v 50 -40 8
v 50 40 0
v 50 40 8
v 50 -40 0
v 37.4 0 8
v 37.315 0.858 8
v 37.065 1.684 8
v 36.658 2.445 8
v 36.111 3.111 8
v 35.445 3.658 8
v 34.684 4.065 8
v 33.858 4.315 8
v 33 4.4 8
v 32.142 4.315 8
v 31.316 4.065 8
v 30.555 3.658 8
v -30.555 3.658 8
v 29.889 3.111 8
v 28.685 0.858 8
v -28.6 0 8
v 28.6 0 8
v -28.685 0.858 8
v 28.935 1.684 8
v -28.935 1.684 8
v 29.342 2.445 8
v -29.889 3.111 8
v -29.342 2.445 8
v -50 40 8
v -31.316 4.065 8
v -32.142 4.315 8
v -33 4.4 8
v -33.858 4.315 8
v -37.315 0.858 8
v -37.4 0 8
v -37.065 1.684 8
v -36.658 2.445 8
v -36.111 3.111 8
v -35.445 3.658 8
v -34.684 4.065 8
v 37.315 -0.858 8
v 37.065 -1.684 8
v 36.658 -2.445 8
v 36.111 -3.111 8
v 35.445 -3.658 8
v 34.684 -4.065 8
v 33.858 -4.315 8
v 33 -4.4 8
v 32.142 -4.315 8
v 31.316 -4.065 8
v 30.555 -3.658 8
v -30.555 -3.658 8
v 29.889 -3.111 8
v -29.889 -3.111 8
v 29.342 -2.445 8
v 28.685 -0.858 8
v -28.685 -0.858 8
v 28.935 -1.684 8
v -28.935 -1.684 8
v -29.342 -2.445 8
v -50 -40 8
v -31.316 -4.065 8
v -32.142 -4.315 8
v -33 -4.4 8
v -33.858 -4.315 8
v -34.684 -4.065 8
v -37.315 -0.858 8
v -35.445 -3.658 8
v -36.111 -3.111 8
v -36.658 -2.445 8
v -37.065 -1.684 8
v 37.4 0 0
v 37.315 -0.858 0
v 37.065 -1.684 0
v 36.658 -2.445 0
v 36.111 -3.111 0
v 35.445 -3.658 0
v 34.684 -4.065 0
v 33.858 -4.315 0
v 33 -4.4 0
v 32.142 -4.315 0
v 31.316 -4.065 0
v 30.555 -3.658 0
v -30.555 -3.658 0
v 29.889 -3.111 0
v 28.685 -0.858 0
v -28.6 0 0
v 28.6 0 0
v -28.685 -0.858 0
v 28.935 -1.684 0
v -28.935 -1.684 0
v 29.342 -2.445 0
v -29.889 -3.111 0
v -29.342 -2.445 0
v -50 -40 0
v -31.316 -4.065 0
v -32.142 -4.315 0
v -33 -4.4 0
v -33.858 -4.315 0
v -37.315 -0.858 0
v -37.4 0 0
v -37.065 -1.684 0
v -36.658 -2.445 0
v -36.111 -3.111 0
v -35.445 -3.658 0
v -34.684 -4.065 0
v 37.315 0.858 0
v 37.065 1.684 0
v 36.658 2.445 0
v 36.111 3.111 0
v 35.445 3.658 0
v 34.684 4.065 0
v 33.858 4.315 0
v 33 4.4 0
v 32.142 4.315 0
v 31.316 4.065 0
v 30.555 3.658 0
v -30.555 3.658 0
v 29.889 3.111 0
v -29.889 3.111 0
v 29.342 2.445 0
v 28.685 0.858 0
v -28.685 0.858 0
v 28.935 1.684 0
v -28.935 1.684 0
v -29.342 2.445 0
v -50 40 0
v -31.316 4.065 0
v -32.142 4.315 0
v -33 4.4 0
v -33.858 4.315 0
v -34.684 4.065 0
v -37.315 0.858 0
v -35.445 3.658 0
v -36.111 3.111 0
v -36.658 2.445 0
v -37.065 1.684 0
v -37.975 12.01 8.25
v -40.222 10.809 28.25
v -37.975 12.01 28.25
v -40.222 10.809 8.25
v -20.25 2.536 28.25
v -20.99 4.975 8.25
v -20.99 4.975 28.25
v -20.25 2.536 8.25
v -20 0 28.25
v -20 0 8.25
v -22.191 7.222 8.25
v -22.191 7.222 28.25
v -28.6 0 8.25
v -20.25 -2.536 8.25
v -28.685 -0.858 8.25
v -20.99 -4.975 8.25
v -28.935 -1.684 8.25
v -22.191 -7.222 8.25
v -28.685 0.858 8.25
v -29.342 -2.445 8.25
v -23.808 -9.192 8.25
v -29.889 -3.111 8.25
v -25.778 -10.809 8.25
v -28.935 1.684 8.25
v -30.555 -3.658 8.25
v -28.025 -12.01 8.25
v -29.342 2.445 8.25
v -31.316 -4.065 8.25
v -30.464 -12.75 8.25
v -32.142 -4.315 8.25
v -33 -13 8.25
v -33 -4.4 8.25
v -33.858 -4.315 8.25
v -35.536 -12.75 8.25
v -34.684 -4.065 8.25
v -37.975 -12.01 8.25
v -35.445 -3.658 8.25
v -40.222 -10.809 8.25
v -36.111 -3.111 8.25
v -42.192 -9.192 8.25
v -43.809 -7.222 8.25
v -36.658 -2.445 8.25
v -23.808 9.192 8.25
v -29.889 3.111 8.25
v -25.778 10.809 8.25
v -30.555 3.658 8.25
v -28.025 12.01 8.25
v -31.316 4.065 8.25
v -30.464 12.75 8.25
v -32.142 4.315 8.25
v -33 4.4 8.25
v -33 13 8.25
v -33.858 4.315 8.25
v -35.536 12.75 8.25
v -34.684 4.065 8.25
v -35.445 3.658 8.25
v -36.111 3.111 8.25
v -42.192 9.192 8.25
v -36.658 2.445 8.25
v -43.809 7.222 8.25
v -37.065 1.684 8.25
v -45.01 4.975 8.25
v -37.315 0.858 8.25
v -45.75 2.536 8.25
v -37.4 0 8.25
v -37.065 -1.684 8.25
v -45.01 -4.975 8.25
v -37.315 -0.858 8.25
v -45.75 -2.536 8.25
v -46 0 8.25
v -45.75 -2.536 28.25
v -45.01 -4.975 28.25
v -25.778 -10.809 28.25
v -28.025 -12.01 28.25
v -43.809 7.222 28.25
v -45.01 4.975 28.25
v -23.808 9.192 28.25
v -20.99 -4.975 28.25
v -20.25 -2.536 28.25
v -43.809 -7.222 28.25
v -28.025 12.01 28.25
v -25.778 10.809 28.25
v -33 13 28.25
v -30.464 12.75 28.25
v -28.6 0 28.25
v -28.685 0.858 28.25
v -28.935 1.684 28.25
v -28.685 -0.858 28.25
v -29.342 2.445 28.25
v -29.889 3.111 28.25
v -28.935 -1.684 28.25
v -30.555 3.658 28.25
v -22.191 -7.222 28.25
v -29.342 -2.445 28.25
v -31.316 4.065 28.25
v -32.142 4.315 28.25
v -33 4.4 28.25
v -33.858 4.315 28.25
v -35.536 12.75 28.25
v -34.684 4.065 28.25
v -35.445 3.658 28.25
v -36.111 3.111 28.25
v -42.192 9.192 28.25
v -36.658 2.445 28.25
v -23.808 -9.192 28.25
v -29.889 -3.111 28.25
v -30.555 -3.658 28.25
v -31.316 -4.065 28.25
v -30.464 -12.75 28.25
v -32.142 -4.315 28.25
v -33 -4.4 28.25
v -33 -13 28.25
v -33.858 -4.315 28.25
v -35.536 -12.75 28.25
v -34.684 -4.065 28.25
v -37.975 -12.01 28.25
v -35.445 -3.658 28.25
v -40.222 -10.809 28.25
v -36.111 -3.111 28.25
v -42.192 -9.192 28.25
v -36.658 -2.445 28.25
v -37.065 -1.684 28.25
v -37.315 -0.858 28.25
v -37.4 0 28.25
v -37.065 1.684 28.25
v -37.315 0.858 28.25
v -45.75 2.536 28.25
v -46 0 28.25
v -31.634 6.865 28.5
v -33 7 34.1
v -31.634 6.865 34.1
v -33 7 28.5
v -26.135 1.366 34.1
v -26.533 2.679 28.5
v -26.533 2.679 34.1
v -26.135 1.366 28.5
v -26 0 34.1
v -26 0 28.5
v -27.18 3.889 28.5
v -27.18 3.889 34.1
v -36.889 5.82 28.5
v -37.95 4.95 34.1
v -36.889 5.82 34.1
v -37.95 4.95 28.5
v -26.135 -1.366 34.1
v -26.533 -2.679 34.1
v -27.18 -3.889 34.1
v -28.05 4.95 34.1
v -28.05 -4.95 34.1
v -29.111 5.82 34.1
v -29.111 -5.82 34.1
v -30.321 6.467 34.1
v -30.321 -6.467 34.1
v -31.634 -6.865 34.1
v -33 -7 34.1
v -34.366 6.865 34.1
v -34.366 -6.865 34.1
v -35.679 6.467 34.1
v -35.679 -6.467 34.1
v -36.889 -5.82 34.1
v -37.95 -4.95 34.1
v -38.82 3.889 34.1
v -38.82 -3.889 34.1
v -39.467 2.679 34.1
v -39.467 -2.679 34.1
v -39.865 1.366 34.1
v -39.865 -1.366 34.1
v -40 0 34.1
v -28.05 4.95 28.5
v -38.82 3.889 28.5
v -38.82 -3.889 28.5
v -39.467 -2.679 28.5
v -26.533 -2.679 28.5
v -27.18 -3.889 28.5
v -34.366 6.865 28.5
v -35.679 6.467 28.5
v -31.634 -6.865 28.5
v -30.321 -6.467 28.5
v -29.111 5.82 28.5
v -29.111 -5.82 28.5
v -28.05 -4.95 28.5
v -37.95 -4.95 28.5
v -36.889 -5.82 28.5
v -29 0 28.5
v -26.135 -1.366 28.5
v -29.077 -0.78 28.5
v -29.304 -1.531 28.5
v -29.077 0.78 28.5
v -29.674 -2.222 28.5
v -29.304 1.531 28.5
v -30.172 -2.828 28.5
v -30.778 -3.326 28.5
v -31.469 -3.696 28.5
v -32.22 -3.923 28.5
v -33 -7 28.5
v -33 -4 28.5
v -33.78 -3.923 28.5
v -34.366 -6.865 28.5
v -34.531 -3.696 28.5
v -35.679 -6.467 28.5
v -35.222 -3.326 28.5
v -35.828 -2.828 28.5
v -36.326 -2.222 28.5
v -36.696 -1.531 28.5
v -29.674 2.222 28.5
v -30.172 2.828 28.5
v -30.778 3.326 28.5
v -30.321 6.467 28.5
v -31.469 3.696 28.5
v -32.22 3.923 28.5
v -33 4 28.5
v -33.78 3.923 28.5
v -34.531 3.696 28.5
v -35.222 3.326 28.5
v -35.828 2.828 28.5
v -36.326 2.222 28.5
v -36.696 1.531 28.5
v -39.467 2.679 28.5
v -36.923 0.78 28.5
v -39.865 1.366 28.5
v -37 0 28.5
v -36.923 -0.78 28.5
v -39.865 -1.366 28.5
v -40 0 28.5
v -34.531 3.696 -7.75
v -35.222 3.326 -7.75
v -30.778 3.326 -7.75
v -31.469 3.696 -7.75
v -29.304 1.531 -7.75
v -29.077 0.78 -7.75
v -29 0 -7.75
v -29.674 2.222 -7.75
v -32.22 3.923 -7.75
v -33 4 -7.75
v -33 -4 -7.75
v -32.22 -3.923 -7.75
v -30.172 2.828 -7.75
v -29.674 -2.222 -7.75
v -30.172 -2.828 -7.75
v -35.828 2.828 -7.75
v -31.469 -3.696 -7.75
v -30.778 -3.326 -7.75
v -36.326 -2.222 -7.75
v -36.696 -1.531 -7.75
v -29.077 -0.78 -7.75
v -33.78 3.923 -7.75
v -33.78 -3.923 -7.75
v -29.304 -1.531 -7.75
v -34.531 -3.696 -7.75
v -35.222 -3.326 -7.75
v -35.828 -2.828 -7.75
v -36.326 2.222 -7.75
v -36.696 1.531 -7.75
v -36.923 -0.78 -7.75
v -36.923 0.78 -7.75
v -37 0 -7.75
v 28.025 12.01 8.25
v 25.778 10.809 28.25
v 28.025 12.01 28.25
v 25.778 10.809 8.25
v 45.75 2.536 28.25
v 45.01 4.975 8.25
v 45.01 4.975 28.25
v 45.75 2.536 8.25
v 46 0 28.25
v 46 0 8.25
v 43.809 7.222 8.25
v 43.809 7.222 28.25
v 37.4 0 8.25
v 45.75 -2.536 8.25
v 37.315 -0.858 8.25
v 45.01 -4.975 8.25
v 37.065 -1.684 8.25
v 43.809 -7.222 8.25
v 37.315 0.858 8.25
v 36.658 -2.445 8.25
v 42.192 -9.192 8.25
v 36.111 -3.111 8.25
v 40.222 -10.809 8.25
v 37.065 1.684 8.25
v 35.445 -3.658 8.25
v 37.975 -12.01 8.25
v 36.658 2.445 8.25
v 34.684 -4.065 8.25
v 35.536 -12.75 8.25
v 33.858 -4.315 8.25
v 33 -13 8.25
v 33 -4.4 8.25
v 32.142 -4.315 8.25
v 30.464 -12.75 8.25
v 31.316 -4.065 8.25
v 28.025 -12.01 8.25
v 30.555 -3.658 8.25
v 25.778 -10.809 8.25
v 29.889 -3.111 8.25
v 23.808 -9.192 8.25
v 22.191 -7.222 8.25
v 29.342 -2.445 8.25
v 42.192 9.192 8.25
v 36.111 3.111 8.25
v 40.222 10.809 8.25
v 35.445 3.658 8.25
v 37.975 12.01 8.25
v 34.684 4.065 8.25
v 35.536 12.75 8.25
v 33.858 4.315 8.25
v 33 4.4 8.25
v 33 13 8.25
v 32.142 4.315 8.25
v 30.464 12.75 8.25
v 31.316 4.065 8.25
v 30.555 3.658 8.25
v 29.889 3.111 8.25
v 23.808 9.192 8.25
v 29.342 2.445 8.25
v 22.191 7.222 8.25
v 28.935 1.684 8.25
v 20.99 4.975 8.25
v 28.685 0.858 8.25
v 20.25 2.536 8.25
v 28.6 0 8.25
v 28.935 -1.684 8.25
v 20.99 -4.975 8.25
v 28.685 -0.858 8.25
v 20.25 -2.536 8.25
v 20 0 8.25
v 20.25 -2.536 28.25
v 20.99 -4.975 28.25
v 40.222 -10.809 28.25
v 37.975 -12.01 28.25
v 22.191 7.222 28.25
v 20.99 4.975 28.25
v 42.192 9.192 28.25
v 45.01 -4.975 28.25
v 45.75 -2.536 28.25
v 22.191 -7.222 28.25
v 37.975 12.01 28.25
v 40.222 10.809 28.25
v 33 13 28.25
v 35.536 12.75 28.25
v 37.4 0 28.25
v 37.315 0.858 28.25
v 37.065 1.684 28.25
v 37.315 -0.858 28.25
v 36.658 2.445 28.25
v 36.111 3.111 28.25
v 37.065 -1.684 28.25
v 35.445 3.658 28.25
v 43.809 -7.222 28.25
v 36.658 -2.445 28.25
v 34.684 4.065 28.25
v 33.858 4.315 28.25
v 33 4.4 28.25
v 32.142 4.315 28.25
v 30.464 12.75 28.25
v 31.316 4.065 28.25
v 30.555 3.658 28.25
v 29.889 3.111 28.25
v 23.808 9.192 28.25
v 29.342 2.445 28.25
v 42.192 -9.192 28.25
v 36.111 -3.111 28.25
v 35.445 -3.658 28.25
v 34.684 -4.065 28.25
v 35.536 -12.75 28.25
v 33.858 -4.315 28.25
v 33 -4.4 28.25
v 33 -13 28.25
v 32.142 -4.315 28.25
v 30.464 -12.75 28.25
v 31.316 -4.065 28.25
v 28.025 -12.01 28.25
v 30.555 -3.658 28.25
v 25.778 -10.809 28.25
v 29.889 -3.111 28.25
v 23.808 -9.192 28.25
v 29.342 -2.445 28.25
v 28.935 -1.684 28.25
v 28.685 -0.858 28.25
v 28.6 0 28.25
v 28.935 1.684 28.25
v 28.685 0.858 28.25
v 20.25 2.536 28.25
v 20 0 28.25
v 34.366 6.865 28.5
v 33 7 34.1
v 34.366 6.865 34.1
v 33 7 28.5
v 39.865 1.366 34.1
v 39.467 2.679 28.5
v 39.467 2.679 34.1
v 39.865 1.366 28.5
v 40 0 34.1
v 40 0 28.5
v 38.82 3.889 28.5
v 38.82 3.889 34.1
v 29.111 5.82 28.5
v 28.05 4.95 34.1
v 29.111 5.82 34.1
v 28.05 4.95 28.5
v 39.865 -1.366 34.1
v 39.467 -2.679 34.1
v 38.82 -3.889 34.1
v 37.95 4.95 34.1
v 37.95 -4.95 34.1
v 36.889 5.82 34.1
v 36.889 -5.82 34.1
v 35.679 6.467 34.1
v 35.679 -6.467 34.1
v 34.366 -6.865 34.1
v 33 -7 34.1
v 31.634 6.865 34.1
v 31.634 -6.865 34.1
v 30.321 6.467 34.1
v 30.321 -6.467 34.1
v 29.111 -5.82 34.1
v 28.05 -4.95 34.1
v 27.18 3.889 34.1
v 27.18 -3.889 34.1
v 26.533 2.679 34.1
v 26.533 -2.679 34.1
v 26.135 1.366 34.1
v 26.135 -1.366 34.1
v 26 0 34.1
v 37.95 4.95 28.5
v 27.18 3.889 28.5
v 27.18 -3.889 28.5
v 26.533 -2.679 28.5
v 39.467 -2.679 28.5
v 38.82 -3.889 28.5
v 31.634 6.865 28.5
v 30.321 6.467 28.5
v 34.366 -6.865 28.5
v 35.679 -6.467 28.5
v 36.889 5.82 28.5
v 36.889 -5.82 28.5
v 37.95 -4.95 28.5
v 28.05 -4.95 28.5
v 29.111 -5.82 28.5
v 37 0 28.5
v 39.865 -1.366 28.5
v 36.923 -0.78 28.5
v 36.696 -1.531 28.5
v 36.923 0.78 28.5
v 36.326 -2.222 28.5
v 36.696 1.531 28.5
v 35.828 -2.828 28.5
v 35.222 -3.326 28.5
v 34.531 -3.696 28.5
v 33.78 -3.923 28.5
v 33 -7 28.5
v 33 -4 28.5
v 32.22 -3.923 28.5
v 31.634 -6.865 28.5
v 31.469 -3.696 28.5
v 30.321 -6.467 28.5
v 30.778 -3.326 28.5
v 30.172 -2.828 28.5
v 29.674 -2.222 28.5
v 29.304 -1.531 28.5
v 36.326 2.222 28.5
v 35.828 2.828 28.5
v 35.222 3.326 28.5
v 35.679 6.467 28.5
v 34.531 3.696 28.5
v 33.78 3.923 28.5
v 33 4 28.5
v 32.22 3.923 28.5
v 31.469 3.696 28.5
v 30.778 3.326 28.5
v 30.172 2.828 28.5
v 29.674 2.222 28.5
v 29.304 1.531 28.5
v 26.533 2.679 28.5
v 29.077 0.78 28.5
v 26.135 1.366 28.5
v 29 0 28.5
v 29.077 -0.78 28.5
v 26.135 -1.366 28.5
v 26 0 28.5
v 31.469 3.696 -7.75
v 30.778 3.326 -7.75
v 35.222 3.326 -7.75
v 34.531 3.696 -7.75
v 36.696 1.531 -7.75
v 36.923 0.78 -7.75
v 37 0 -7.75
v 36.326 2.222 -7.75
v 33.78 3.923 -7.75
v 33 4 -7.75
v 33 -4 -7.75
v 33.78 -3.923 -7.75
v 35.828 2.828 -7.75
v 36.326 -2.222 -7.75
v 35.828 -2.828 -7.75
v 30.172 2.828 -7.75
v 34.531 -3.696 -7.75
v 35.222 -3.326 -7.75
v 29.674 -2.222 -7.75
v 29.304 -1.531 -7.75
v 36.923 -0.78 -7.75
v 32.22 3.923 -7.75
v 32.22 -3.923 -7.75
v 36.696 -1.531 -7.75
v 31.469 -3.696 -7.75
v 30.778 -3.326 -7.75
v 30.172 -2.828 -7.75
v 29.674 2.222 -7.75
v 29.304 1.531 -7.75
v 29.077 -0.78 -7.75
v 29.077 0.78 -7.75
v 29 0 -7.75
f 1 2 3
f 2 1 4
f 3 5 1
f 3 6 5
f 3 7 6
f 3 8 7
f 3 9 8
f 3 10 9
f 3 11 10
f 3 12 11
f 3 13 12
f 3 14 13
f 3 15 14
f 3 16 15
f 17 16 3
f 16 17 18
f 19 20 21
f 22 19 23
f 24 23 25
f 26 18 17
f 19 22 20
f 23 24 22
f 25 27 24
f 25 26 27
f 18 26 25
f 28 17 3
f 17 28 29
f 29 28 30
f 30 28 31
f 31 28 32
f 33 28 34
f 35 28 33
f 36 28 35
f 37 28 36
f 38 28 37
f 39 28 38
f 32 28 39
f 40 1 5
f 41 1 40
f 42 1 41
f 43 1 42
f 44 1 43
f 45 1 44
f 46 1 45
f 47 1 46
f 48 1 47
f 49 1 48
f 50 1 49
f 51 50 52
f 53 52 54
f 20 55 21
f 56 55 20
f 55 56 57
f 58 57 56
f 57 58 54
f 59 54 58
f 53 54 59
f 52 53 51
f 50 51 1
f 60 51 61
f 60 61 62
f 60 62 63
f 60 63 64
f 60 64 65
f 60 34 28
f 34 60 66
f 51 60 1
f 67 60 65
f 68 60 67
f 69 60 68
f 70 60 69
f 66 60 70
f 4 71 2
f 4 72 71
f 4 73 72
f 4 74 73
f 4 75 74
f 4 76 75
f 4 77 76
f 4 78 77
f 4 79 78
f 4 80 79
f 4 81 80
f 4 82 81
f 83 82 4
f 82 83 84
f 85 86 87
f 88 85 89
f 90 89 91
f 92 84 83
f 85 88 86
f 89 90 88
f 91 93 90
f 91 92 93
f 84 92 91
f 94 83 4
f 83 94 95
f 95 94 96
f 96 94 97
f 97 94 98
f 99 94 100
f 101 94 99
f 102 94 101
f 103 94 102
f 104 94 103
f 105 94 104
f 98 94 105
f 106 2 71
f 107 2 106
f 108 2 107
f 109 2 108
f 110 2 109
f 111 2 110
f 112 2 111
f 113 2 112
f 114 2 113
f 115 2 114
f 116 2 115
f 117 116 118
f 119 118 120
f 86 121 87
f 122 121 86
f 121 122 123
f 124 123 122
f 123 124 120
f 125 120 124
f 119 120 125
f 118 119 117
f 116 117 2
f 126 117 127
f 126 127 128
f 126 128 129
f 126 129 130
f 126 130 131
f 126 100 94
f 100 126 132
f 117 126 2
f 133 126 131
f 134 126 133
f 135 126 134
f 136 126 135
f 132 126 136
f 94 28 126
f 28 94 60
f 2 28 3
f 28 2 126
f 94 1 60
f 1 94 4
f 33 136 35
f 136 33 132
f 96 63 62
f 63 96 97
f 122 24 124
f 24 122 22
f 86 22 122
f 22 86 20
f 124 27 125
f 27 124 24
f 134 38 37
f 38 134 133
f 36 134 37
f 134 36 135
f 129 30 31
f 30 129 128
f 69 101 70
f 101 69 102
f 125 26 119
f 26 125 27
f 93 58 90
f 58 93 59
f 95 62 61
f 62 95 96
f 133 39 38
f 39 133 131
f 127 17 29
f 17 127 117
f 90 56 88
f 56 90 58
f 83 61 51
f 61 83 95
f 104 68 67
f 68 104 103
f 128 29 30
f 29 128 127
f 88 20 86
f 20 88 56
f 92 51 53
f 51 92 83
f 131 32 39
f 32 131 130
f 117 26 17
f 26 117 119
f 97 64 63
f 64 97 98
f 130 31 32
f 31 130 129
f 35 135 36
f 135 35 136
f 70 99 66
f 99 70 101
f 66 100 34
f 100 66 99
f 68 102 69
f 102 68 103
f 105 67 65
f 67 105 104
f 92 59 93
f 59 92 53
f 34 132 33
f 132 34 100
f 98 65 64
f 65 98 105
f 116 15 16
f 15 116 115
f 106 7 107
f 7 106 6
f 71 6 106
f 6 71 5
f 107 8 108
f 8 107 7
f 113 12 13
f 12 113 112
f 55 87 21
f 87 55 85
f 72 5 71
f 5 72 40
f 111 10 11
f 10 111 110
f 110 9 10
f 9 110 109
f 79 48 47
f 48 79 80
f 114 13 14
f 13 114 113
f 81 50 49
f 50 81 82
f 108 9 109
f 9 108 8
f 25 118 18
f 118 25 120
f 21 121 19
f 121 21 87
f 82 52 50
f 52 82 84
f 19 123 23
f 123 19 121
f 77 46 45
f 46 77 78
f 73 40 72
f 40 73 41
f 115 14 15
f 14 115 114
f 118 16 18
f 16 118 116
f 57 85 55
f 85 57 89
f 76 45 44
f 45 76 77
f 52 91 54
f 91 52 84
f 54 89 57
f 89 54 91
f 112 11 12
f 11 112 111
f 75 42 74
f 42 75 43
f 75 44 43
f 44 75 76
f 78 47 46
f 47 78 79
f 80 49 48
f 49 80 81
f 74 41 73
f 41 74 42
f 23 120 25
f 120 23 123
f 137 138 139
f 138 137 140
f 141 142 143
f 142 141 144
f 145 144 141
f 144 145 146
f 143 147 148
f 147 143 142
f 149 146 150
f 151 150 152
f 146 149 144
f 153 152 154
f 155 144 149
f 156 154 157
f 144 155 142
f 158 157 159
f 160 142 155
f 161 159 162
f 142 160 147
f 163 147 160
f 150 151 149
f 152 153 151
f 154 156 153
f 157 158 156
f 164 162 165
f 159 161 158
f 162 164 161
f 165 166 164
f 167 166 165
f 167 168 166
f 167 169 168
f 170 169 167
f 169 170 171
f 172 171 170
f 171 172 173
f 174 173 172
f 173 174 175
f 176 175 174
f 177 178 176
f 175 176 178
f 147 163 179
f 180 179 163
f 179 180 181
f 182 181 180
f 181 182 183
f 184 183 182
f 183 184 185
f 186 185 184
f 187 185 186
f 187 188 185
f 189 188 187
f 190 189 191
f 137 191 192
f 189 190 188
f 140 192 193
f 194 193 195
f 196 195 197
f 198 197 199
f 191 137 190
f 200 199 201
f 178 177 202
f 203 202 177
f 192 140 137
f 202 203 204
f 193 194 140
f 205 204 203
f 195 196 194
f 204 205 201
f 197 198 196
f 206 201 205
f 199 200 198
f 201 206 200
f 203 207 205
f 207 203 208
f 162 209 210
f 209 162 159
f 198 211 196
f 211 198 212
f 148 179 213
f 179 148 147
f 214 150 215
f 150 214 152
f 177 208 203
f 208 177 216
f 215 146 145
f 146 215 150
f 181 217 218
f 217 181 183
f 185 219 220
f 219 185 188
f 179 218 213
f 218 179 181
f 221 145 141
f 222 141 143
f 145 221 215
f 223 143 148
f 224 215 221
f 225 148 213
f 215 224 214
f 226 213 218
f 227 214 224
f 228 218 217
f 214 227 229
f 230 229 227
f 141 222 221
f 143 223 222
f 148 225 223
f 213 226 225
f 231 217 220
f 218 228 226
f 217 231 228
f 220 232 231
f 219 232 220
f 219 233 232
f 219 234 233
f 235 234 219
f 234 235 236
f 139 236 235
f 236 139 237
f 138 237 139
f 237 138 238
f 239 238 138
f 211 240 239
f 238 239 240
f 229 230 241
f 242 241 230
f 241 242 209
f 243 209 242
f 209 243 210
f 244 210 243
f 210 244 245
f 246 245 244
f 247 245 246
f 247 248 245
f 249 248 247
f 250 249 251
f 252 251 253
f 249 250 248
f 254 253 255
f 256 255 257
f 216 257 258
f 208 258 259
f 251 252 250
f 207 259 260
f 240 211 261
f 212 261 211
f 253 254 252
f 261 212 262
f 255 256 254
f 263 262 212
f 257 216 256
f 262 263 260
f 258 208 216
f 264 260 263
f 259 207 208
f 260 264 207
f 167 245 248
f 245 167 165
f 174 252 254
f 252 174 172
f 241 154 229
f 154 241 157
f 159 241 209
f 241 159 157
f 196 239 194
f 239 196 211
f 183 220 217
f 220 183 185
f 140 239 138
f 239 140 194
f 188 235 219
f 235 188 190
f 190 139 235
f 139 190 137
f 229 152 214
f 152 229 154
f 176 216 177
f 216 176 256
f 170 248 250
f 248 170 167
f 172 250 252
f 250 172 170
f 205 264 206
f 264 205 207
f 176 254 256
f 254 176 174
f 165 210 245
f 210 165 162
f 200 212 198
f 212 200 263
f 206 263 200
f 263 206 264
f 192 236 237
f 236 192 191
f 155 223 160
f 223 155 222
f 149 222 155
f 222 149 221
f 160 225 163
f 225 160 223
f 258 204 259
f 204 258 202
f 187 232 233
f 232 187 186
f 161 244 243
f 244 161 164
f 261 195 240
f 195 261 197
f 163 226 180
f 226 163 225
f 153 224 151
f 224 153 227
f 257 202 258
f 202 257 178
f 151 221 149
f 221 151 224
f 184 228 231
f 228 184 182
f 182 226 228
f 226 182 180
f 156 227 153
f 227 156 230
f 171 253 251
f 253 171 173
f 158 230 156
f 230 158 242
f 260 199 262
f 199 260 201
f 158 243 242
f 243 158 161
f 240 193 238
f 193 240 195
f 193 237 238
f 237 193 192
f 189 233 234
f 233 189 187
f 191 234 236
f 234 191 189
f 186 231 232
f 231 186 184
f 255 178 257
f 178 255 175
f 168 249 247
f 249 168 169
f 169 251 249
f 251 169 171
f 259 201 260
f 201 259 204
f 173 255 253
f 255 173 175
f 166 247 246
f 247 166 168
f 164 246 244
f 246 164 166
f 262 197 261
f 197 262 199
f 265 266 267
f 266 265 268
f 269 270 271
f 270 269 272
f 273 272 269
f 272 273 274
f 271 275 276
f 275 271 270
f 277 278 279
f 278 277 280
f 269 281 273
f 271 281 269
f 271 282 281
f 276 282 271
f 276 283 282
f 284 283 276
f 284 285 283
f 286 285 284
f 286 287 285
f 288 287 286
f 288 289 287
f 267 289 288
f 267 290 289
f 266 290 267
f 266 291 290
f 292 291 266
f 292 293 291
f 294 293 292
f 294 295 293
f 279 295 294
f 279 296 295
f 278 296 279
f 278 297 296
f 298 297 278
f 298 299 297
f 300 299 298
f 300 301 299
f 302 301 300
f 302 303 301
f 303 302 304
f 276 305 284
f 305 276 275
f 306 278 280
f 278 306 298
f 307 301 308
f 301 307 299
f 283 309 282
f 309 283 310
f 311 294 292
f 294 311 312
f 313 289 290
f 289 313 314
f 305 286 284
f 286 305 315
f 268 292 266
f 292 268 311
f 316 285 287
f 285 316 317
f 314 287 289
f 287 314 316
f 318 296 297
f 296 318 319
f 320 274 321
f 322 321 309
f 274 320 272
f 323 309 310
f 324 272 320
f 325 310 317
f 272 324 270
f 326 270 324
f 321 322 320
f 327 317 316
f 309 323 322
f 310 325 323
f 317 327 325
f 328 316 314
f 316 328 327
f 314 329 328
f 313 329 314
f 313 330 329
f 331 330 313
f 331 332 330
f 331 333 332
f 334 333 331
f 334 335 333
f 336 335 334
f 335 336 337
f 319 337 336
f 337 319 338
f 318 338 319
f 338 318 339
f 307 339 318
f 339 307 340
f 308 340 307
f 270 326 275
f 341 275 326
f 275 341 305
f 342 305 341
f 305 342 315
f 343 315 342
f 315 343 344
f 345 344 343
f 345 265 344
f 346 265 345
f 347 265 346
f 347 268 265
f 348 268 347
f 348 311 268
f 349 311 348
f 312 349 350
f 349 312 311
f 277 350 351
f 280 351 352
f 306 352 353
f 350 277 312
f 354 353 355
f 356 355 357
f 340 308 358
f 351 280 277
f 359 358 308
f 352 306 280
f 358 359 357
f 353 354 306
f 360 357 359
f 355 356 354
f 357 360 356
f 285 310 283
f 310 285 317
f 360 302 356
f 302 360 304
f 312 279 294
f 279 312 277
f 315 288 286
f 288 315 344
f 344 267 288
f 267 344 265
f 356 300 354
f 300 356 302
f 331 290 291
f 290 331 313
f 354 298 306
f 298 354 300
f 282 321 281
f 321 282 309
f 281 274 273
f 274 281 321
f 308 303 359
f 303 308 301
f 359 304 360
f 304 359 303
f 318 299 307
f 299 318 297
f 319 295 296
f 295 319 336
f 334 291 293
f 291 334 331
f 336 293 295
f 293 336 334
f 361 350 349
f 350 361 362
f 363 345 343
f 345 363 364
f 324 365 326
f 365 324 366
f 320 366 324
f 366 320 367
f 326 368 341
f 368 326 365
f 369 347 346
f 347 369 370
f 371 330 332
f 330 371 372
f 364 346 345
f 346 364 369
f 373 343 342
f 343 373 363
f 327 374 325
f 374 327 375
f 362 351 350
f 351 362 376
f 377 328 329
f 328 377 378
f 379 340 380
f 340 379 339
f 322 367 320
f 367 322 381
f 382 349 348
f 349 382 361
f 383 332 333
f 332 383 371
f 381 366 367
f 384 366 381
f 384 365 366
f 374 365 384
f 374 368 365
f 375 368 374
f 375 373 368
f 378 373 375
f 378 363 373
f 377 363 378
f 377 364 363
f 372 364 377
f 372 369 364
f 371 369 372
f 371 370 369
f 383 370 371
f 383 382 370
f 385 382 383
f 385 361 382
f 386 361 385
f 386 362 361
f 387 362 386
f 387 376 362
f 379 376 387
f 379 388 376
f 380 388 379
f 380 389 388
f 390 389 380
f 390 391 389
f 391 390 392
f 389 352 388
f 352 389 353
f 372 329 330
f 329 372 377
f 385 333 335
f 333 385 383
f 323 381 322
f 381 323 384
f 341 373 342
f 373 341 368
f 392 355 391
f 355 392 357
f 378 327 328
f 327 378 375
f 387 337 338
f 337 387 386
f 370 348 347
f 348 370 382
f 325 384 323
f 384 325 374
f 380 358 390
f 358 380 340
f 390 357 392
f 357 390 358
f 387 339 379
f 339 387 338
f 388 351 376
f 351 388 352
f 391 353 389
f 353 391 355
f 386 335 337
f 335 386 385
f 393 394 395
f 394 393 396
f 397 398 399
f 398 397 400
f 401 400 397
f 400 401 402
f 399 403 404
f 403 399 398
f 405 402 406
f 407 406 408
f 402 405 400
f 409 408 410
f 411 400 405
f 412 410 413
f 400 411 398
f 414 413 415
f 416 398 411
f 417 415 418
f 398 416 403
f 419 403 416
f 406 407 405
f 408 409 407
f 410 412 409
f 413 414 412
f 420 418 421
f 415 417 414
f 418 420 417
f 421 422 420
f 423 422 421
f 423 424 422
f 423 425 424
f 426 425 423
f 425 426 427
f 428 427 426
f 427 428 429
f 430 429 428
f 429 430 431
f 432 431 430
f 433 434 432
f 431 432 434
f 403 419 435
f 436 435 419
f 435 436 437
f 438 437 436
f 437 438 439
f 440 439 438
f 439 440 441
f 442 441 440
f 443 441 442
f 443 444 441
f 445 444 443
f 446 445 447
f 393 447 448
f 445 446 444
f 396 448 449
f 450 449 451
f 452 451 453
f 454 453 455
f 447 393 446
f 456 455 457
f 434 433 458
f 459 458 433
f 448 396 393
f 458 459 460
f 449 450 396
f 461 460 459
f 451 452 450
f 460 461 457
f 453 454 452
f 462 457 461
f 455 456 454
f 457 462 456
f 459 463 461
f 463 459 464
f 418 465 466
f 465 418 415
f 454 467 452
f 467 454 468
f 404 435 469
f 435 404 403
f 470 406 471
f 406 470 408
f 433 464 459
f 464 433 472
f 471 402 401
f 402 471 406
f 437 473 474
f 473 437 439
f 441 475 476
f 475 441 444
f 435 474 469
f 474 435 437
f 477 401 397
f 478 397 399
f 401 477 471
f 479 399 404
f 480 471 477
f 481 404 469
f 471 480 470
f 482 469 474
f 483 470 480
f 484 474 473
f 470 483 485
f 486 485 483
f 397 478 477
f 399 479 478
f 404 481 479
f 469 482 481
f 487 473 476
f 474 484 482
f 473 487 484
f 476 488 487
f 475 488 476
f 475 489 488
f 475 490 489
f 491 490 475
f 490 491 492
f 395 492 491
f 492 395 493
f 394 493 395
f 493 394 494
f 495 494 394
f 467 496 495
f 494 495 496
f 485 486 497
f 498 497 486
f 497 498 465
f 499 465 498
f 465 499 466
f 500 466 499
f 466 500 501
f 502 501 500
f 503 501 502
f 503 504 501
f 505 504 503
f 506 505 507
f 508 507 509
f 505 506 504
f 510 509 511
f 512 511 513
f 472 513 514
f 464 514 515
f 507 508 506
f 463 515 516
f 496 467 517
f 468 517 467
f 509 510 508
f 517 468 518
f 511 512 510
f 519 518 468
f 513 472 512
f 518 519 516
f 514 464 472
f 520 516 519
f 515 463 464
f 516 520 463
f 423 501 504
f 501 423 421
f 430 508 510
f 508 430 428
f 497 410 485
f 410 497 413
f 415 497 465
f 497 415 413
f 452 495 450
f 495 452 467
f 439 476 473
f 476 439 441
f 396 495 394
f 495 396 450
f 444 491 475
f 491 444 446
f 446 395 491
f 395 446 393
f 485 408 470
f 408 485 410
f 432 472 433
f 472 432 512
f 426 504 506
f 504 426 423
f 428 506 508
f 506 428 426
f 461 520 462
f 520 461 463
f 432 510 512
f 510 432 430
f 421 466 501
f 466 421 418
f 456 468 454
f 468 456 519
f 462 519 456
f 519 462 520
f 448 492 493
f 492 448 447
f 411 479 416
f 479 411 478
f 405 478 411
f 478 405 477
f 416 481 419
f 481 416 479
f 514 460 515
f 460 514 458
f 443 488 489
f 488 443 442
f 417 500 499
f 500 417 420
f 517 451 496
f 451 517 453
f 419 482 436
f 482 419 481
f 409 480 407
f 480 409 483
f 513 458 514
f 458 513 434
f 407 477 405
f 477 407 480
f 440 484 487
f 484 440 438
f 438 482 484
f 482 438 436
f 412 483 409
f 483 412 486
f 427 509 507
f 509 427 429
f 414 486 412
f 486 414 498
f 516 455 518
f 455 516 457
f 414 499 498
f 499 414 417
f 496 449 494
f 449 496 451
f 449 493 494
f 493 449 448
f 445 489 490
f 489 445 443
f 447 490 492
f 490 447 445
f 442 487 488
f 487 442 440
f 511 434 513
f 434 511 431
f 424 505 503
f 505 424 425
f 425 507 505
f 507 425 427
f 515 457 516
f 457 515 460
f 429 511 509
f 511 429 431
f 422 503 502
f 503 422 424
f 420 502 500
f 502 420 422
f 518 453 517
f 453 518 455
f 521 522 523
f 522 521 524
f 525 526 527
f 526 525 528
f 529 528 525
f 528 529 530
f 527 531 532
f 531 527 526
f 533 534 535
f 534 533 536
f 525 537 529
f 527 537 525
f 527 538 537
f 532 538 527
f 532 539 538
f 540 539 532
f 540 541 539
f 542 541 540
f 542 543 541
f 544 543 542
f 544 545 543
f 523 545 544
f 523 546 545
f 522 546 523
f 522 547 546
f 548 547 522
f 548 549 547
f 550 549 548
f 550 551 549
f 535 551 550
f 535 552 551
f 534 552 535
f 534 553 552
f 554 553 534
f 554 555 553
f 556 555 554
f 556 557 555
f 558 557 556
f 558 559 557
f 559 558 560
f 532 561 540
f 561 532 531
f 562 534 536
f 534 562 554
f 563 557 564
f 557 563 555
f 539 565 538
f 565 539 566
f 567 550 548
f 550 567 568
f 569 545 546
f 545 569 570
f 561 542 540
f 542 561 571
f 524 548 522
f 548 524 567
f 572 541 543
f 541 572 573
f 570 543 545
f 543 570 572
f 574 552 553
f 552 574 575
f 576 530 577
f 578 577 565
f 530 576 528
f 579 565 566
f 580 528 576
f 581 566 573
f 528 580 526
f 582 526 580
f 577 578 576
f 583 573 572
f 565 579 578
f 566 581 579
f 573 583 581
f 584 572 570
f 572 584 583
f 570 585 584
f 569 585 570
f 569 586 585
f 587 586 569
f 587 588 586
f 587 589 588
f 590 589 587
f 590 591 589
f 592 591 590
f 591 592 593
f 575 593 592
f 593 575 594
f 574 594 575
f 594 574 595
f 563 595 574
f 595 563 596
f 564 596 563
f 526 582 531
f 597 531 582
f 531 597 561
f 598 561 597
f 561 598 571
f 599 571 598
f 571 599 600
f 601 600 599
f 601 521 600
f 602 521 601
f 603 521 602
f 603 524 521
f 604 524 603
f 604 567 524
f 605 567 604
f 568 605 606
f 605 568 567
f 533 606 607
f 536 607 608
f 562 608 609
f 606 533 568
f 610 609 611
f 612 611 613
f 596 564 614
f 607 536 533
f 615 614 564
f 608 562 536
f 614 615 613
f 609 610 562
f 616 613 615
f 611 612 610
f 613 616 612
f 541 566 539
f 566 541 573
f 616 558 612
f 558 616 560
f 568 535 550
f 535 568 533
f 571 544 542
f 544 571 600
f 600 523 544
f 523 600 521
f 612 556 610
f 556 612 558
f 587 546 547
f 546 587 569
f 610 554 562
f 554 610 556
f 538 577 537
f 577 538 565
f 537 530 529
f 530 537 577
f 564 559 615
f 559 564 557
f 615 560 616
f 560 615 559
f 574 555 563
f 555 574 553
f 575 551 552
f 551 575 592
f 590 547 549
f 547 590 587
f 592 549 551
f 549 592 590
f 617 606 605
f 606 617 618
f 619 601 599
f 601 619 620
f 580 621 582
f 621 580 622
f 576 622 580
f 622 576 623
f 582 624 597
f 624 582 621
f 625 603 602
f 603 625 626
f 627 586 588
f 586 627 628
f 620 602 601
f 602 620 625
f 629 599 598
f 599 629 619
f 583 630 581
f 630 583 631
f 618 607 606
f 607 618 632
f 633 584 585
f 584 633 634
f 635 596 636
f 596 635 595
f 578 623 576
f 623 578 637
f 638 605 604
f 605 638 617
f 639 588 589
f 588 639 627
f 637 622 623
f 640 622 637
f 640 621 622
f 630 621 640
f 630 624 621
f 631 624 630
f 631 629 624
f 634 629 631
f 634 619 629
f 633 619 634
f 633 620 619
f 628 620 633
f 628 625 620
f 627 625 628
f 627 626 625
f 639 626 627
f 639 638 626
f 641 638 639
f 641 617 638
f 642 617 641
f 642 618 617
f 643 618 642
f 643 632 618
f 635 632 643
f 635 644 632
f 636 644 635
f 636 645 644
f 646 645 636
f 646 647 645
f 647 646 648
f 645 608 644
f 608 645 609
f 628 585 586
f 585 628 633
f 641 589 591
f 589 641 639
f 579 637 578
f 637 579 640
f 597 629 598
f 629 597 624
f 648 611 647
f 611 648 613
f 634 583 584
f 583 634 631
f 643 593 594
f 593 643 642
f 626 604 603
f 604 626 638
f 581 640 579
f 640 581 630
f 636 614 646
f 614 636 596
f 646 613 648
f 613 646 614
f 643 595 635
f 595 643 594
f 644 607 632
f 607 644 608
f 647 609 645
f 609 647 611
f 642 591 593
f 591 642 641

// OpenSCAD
$fn = 32;

// ------------------------------------------------------------------------
// Standoff columns: 2 d26 standoffs, bolts d8
// Every part is its own module, assembly() places them once.
// ------------------------------------------------------------------------

// --- part 1 ---
module base_plate() {
  difference() {
    translate([-50, -40, 0]) cube([100, 80, 8]);
    translate([-33, 0, -1]) cylinder(h = 10, d = 8.8);
    translate([33, 0, -1]) cylinder(h = 10, d = 8.8);
  }
}

// --- part 2 ---
module spacer1() {
  difference() {
      translate([0, 0, 0]) cylinder(h = 20, d = 26);
      translate([0, 0, -1]) cylinder(h = 22, d = 8.8);
    }
}

// --- part 3 ---
module bolt1() {
  cylinder(h = 5.6, d = 14);
  translate([0, 0, -36.25]) cylinder(h = 36.25, d = 8);
}

// --- part 4 ---
module spacer2() {
  difference() {
      translate([0, 0, 0]) cylinder(h = 20, d = 26);
      translate([0, 0, -1]) cylinder(h = 22, d = 8.8);
    }
}

// --- part 5 ---
module bolt2() {
  cylinder(h = 5.6, d = 14);
  translate([0, 0, -36.25]) cylinder(h = 36.25, d = 8);
}

// --- assembly ---
module assembly() {
  translate([0, 0, 0]) rotate([0, 0, 0]) base_plate();
  translate([-33, 0, 8.25]) rotate([0, 0, 0]) spacer1();
  translate([-33, 0, 28.5]) rotate([0, 0, 0]) bolt1();
  translate([33, 0, 8.25]) rotate([0, 0, 0]) spacer2();
  translate([33, 0, 28.5]) rotate([0, 0, 0]) bolt2();
}

assembly();
